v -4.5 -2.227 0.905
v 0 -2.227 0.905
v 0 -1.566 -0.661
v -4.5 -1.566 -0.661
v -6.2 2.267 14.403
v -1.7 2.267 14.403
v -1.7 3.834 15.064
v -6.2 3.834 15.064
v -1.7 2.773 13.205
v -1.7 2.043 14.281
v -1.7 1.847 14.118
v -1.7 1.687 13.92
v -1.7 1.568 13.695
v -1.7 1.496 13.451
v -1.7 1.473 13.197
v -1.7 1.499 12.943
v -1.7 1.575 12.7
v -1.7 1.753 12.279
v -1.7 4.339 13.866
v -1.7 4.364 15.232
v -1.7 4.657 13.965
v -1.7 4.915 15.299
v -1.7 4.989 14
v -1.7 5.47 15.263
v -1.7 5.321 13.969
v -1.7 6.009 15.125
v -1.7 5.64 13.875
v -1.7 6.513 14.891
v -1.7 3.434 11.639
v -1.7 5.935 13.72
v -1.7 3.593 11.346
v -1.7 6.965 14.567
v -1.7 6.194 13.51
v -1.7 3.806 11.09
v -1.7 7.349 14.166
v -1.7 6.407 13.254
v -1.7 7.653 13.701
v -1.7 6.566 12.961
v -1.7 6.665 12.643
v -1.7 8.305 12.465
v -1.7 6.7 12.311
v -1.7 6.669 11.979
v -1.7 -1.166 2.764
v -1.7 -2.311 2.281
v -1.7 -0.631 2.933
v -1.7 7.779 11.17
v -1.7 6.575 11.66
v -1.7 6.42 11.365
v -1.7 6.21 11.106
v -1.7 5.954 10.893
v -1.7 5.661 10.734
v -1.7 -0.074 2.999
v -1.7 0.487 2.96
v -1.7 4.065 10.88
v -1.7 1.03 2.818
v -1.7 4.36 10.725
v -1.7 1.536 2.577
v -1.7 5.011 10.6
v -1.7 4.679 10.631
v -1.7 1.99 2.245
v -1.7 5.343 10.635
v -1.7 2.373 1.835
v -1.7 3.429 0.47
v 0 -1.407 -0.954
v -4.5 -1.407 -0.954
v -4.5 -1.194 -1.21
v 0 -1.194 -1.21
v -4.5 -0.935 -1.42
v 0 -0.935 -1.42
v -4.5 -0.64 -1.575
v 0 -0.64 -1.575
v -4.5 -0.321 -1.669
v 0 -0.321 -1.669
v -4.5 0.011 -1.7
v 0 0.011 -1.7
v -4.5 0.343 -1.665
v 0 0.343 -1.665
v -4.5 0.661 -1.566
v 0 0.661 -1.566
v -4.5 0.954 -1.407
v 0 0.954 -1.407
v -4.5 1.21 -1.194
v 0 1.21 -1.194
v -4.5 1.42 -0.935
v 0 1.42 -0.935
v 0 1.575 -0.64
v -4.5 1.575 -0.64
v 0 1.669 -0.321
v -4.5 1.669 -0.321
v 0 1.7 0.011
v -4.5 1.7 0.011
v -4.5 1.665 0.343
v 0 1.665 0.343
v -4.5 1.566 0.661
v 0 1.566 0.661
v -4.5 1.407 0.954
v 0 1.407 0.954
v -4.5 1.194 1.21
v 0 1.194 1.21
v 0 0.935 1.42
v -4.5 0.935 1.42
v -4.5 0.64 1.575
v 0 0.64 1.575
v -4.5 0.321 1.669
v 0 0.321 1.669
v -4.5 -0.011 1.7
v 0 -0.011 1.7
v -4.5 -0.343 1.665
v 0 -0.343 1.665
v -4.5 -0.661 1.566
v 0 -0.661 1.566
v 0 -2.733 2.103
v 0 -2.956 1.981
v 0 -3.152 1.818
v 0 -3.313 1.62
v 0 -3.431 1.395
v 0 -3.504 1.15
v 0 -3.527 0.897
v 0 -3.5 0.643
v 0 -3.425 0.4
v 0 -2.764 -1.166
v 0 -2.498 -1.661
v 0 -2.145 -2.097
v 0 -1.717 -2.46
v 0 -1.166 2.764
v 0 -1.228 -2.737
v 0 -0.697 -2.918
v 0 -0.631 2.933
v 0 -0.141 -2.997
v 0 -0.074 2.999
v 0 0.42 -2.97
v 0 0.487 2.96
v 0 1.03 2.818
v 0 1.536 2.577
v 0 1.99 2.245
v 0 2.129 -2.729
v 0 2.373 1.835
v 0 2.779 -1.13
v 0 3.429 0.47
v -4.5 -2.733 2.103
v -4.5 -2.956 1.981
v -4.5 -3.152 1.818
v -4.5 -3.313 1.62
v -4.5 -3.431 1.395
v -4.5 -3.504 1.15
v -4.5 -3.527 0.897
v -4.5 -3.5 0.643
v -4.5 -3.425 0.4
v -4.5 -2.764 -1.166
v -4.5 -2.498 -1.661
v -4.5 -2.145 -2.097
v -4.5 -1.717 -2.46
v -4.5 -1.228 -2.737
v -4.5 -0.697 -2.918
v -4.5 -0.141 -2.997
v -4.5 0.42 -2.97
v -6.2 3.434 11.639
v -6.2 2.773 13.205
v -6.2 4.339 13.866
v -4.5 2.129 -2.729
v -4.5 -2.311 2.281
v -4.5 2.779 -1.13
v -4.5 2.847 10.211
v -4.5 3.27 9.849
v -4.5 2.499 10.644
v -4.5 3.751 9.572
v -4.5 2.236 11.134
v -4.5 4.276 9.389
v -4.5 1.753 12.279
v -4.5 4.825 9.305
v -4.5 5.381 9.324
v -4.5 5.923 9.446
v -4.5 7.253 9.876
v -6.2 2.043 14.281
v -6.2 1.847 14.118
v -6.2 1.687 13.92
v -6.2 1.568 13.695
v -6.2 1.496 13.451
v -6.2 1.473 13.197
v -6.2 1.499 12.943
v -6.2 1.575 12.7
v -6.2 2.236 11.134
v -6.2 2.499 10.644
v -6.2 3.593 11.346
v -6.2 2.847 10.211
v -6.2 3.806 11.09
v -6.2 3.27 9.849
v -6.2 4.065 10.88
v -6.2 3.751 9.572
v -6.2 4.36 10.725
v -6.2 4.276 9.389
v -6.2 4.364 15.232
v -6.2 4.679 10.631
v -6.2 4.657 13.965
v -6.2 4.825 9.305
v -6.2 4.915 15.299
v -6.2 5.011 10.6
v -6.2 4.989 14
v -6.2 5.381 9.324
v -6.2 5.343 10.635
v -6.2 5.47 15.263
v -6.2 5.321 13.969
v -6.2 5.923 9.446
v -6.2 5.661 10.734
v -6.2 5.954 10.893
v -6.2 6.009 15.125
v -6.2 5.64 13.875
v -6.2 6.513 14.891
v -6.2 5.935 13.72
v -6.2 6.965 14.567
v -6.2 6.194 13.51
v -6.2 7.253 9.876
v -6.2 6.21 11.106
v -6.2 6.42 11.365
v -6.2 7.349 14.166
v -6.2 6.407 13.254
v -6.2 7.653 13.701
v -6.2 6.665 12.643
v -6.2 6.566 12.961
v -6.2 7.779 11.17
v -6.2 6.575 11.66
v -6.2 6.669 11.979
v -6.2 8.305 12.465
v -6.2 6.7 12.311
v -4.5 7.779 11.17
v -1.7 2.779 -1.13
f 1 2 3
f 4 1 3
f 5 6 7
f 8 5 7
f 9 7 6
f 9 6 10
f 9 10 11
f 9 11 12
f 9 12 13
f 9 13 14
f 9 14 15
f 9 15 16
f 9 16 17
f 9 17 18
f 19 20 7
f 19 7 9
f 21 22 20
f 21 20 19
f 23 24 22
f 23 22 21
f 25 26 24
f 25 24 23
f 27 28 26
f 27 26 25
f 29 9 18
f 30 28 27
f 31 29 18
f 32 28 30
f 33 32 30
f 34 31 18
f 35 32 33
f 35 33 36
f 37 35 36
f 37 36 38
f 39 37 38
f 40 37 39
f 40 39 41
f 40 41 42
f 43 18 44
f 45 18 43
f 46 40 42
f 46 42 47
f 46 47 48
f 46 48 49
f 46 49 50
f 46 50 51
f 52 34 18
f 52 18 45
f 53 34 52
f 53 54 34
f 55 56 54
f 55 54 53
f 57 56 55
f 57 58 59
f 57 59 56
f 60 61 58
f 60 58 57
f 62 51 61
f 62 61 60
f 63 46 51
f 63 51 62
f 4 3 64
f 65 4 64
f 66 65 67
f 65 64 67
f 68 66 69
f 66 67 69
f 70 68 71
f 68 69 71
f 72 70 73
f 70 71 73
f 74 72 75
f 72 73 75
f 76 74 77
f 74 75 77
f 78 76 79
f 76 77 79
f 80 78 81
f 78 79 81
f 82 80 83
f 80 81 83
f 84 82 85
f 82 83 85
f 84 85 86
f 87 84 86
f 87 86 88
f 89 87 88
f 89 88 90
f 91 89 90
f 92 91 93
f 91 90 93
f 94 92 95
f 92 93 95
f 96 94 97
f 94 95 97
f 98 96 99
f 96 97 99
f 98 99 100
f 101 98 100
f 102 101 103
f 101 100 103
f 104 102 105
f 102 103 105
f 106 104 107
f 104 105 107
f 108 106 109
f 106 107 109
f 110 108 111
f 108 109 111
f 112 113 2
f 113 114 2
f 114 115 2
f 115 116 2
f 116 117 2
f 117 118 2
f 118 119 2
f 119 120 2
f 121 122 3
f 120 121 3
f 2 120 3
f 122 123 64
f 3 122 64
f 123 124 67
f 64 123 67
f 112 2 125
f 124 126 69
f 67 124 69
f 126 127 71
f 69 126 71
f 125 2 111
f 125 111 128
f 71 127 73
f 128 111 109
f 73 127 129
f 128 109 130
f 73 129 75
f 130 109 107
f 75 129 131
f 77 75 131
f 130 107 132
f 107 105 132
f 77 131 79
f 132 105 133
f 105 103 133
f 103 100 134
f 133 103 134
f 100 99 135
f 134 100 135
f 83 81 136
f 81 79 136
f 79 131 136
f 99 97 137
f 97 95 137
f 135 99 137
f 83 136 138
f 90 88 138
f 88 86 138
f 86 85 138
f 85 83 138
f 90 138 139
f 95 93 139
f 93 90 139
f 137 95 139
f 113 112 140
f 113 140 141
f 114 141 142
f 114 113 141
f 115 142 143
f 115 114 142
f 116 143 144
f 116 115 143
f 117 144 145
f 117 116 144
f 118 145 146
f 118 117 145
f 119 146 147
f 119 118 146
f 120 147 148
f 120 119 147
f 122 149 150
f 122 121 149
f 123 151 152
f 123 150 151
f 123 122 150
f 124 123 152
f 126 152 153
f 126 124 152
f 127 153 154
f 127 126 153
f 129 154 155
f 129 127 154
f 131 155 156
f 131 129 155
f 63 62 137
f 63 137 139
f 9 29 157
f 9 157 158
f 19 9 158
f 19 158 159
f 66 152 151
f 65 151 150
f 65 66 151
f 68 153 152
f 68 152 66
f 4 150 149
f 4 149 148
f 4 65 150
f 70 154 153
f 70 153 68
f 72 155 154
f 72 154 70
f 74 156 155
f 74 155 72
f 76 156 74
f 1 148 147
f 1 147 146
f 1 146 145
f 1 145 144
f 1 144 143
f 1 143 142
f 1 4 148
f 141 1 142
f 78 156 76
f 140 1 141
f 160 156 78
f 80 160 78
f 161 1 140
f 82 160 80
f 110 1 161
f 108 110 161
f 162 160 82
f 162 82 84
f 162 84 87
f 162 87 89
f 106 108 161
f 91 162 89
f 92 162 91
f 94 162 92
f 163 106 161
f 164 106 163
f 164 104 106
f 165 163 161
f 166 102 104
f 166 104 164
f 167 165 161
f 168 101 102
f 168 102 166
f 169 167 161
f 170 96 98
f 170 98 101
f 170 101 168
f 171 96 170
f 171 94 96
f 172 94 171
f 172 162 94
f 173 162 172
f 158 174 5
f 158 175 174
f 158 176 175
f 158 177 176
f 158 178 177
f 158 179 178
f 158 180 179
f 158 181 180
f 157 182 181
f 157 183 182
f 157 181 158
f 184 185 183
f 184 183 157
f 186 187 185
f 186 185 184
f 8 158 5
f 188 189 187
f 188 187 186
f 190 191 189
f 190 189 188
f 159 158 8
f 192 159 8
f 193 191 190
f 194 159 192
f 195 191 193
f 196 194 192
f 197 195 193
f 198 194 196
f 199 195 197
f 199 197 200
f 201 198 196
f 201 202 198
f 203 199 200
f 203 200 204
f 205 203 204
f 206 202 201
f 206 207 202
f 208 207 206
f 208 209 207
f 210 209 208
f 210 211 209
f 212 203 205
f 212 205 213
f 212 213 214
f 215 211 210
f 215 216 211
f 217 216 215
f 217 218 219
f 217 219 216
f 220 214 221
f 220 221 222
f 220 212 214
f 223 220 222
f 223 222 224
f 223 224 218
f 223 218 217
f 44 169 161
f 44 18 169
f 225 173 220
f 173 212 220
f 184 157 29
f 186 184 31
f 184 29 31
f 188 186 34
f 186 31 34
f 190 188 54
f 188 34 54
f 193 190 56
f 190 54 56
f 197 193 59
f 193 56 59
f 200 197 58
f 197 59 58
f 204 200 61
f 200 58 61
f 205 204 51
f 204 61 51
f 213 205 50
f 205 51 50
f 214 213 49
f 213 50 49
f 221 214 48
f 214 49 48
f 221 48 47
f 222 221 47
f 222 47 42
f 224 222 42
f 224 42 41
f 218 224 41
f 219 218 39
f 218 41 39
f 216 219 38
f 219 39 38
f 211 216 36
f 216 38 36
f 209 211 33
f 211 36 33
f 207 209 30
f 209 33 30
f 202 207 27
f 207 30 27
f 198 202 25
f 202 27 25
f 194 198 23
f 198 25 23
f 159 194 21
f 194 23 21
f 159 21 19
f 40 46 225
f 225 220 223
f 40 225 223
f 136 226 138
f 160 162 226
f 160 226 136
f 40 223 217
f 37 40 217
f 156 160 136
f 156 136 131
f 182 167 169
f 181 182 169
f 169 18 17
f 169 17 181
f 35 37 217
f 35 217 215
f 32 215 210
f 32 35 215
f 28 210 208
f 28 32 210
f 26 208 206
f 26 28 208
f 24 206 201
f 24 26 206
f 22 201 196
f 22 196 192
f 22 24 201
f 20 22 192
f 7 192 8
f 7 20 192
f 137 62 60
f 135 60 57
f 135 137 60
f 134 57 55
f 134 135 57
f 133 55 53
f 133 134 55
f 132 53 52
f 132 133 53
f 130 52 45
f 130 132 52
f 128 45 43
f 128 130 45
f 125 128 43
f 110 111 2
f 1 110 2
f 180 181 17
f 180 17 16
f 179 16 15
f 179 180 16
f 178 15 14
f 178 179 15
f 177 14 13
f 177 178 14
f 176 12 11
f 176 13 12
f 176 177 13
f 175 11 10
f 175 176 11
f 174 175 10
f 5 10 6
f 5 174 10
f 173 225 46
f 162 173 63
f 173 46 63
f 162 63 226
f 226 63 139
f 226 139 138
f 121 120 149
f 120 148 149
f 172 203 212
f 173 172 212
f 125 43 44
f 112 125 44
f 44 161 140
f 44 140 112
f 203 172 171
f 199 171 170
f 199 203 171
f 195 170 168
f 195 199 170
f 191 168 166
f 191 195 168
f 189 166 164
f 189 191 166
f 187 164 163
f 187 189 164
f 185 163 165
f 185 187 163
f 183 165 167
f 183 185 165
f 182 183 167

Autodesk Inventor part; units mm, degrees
ref_plane "YZ Plane" through (0, 0, 0) normal (1, 0, 0) x (0, 1, 0)
ref_plane "XY Plane" through (0, 0, 0) normal (0, 0, 1) x (1, 0, 0)
sketch "スケッチ1" plane through (0, 0, 0) normal (1, 0, 0) x (0, 1, 0)
  arc A0 (-2.7792, 1.1297) -> (2.7792, -1.1297) centre (0, 0) ccw
  circle A1 centre (5, 12.3) radius 1.7
  arc A2 (7.7792, 11.1703) -> (2.2208, 13.4297) centre (5, 12.3) ccw
  circle A3 centre (0, 0) radius 1.7
  line L0 (2.2208, 13.4297) -> (-2.7792, 1.1297)
  line L1 (7.7792, 11.1703) -> (2.7792, -1.1297)
  dimension "d1" = 3.4
  dimension "d2" = 6
  dimension "d3" = 3.4
  dimension "d4" = 5
  dimension "d5" = 12.3
  dimension "d8" = 3
extrude "押し出し1" add sketch "スケッチ1" against normal blind 6.2
sketch "スケッチ2" plane through (0, 0, 0) normal (1, 0, 0) x (0, 0, -1)
  circle A0 centre (0, 0) radius 1.7 projected
  circle A1 centre (-12.3, 5) radius 1.7 projected
  line L0 (-1.1297, -2.7792) -> (-13.4297, 2.2208) projected
  arc A2 (-1.1297, -2.7792) -> (1.1297, 2.7792) centre (0, 0) ccw projected
  line L1 (-11.1703, 7.7792) -> (1.1297, 2.7792) projected
  arc A3 (-11.1703, 7.7792) -> (-13.4297, 2.2208) centre (-12.3, 5) ccw projected
  circle A4 centre (0, 0) radius 3
  line L2 (-1.1297, -2.7792) -> (1.1297, 2.7792)
  dimension "d11" = 6
extrude "押し出し2" cut sketch "スケッチ2" against normal blind 1.7 contours A4 L0 A3 L1
sketch "スケッチ3" plane through (-6.2, 0, 0) normal (-1, 0, 0) x (0, 0, 1)
  circle A0 centre (0, 0) radius 1.7 projected
  circle A1 centre (12.3, 5) radius 1.7 projected
  line L0 (1.1297, -2.7792) -> (13.4297, 2.2208) projected
  arc A2 (13.4297, 2.2208) -> (11.1703, 7.7792) centre (12.3, 5) ccw projected
  line L1 (11.1703, 7.7792) -> (-1.1297, 2.7792) projected
  arc A3 (-1.1297, 2.7792) -> (1.1297, -2.7792) centre (0, 0) ccw projected
  circle A4 centre (12.3, 5) radius 3
  line L2 (11.1703, 7.7792) -> (13.4297, 2.2208)
  line L3 (1.1297, -2.7792) -> (13.4297, 2.2208) projected
  dimension "d14" = 6
extrude "押し出し3" cut sketch "スケッチ3" against normal blind 1.7 contours A4 L0 A3 L1
sketch "スケッチ4" plane through (-1.7, 0, 0) normal (1, 0, 0) x (0, 0, -1)
  arc A0 (1.1297, 2.7792) -> (-1.1297, -2.7792) centre (0, 0) ccw projected
  line L0 (-11.1703, 7.7792) -> (1.1297, 2.7792) projected
  arc A1 (-11.1703, 7.7792) -> (-13.4297, 2.2208) centre (-12.3, 5) ccw projected
  line L1 (-1.1297, -2.7792) -> (-13.4297, 2.2208) projected
  circle A2 centre (-12.3, 5) radius 1.7 projected
  line L2 (-13.4297, 2.2208) -> (-13.8977, 1.0697)
  line L3 (-13.8977, 1.0697) -> (-15.064, 3.8337)
  arc A3 (-11.1703, 7.7792) -> (-13.4297, 2.2208) centre (-12.3, 5) ccw projected
  dimension "d17" = 45
extrude "押し出し4" add sketch "スケッチ4" against normal up to surface (4.5 mm away) contours L2 L3 A1
mirror "ミラー1" about plane through (-1.7, 2.2208, 13.4297) normal (0, -0.3765791, -0.9263845) of "押し出し4"
sketch "スケッチ5" plane through (-1.7, 0, 0) normal (1, 0, 0) x (0, 0, -1)
  line L0 (-1.1297, -2.7792) -> (-12.2786, 1.7529) projected
  arc A0 (1.1297, 2.7792) -> (-1.1297, -2.7792) centre (0, 0) ccw projected
  line L1 (-11.1703, 7.7792) -> (1.1297, 2.7792) projected
  arc A1 (-11.1703, 7.7792) -> (-15.064, 3.8337) centre (-12.3, 5) ccw projected
  line L2 (-15.064, 3.8337) -> (-13.8977, 1.0697) projected
  line L3 (-12.2786, 1.7529) -> (-13.8977, 1.0697) projected
  circle A2 centre (-12.3, 5) radius 1.7 projected
  line L4 (-12.9402, 3.4251) -> (-13.2054, 2.7728)
  line L5 (-13.2054, 2.7728) -> (-13.8663, 4.3391)
  circle A3 centre (-12.3, 5) radius 1.7 projected
  arc A4 (-13.8663, 4.3391) -> (-12.9402, 3.4251) centre (-12.3, 5) ccw
  dimension "d20" = 45
extrude "押し出し5" cut sketch "スケッチ5" against normal blind 10 contours A2 L4 L5
mirror "ミラー2" about plane through (-1.7, 3.4251, 12.9402) normal (0, 0.3765791, 0.9263845) of "押し出し5"
fillet "フィレット1" radius 1.3 1 edges at (-3.95, 1.0697, 13.8977)
sketch "スケッチ6" plane through (-4.5, 0, 0) normal (-1, 0, 0) x (0, 0, 1)
  circle A0 centre (0, 0) radius 1.7 projected
  line L0 (12.2786, 1.7529) -> (11.1337, 2.236) projected
  arc A1 (11.1703, 7.7792) -> (11.1337, 2.236) centre (12.3, 5) ccw projected
  line L1 (-1.1297, 2.7792) -> (11.1703, 7.7792) projected
  arc A2 (-1.1297, 2.7792) -> (1.1297, -2.7792) centre (0, 0) ccw projected
  line L2 (12.2786, 1.7529) -> (1.1297, -2.7792) projected
  line L3 (1.1297, -2.7792) -> (1.5977, -3.9303)
  line L4 (1.5977, -3.9303) -> (-1.1663, -2.764)
  dimension "d24" = 45
extrude "押し出し6" add sketch "スケッチ6" against normal up to surface (4.5 mm away) contours L3 L4 A2
mirror "ミラー3" about plane through (-4.5, -2.7792, 1.1297) normal (0, 0.3765791, 0.9263845) of "押し出し6"
sketch "スケッチ7" plane through (-4.5, 0, 0) normal (-1, 0, 0) x (0, 0, 1)
  circle A0 centre (0, 0) radius 1.7 projected
  line L0 (0.6402, -1.5749) -> (0.9054, -2.2272)
  line L1 (0.9054, -2.2272) -> (-0.6609, -1.5663)
  line L2 (-1.1297, 2.7792) -> (11.1703, 7.7792) projected
  dimension "d29" = 45
extrude "押し出し7" cut sketch "スケッチ7" against normal blind 10 contours A0 L0 L1
mirror "ミラー4" about plane through (-4.5, -1.5749, 0.6402) normal (0, -0.3765791, -0.9263845) of "押し出し7"
fillet "フィレット2" radius 1.3 1 edges at (-2.25, -3.9303, 1.5977)
sketch "スケッチ8" plane through (-4.5, 0, 0) normal (-1, 0, 0) x (0, 0, 1)
  line L0 (-1.1297, 2.7792) -> (11.1703, 7.7792) projected
  arc A0 (-1.1297, 2.7792) -> (-1.1663, -2.764) centre (0, 0) ccw projected
  line L1 (-1.1297, 2.7792) -> (-2.7291, 2.129)
  line L2 (-2.7291, 2.129) -> (-2.9705, 0.4196)
extrude "押し出し8" add sketch "スケッチ8" against normal up to surface (4.5 mm away)
ref_plane "作業平面1" through (0, 2.7792, -1.1297) normal (0, -0.3765791, -0.9263845) x (-1, 0, 0)
mirror "ミラー5" about plane through (0, 2.7792, -1.1297) normal (0, -0.3765791, -0.9263845) of "押し出し8"
sketch "スケッチ9" plane through (-6.2, 0, 0) normal (-1, 0, 0) x (0, 0, 1)
  arc A0 (12.7, 1.5751) -> (14.4031, 2.2674) centre (13.2054, 2.7728) ccw projected
  line L0 (14.4031, 2.2674) -> (15.064, 3.8337) projected
  arc A1 (15.064, 3.8337) -> (11.1337, 2.236) centre (12.3, 5) ccw projected
  line L1 (12.7, 1.5751) -> (11.1337, 2.236) projected
  line L2 (13.2054, 2.7728) -> (11.6391, 3.4337) projected
  arc A2 (13.8663, 4.3391) -> (11.6391, 3.4337) centre (12.3, 5) ccw projected
  line L3 (13.8663, 4.3391) -> (13.2054, 2.7728) projected
  line L4 (-2.7291, 2.129) -> (11.1703, 7.7792) projected
  line L5 (11.1703, 7.7792) -> (12.4648, 8.3054)
  line L6 (12.4648, 8.3054) -> (13.7006, 7.653)
  point P0 (0, 0)
extrude "押し出し9" add sketch "スケッチ9" against normal up to surface (4.5 mm away) contours L5 L6 A1
ref_plane "作業平面2" through (0, 7.7792, 11.1703) normal (0, -0.3765791, -0.9263845) x (-1, 0, 0)
mirror "ミラー6" about plane through (0, 7.7792, 11.1703) normal (0, -0.3765791, -0.9263845) of "押し出し9"
ref_plane "作業平面3" through (0, 7.7792, 11.1703) normal (0, -0.3765791, -0.9263845) x (-1, 0, 0)
properties part number "HbRing-LittleCouplerLink01" material "ナイロン 6/6"
